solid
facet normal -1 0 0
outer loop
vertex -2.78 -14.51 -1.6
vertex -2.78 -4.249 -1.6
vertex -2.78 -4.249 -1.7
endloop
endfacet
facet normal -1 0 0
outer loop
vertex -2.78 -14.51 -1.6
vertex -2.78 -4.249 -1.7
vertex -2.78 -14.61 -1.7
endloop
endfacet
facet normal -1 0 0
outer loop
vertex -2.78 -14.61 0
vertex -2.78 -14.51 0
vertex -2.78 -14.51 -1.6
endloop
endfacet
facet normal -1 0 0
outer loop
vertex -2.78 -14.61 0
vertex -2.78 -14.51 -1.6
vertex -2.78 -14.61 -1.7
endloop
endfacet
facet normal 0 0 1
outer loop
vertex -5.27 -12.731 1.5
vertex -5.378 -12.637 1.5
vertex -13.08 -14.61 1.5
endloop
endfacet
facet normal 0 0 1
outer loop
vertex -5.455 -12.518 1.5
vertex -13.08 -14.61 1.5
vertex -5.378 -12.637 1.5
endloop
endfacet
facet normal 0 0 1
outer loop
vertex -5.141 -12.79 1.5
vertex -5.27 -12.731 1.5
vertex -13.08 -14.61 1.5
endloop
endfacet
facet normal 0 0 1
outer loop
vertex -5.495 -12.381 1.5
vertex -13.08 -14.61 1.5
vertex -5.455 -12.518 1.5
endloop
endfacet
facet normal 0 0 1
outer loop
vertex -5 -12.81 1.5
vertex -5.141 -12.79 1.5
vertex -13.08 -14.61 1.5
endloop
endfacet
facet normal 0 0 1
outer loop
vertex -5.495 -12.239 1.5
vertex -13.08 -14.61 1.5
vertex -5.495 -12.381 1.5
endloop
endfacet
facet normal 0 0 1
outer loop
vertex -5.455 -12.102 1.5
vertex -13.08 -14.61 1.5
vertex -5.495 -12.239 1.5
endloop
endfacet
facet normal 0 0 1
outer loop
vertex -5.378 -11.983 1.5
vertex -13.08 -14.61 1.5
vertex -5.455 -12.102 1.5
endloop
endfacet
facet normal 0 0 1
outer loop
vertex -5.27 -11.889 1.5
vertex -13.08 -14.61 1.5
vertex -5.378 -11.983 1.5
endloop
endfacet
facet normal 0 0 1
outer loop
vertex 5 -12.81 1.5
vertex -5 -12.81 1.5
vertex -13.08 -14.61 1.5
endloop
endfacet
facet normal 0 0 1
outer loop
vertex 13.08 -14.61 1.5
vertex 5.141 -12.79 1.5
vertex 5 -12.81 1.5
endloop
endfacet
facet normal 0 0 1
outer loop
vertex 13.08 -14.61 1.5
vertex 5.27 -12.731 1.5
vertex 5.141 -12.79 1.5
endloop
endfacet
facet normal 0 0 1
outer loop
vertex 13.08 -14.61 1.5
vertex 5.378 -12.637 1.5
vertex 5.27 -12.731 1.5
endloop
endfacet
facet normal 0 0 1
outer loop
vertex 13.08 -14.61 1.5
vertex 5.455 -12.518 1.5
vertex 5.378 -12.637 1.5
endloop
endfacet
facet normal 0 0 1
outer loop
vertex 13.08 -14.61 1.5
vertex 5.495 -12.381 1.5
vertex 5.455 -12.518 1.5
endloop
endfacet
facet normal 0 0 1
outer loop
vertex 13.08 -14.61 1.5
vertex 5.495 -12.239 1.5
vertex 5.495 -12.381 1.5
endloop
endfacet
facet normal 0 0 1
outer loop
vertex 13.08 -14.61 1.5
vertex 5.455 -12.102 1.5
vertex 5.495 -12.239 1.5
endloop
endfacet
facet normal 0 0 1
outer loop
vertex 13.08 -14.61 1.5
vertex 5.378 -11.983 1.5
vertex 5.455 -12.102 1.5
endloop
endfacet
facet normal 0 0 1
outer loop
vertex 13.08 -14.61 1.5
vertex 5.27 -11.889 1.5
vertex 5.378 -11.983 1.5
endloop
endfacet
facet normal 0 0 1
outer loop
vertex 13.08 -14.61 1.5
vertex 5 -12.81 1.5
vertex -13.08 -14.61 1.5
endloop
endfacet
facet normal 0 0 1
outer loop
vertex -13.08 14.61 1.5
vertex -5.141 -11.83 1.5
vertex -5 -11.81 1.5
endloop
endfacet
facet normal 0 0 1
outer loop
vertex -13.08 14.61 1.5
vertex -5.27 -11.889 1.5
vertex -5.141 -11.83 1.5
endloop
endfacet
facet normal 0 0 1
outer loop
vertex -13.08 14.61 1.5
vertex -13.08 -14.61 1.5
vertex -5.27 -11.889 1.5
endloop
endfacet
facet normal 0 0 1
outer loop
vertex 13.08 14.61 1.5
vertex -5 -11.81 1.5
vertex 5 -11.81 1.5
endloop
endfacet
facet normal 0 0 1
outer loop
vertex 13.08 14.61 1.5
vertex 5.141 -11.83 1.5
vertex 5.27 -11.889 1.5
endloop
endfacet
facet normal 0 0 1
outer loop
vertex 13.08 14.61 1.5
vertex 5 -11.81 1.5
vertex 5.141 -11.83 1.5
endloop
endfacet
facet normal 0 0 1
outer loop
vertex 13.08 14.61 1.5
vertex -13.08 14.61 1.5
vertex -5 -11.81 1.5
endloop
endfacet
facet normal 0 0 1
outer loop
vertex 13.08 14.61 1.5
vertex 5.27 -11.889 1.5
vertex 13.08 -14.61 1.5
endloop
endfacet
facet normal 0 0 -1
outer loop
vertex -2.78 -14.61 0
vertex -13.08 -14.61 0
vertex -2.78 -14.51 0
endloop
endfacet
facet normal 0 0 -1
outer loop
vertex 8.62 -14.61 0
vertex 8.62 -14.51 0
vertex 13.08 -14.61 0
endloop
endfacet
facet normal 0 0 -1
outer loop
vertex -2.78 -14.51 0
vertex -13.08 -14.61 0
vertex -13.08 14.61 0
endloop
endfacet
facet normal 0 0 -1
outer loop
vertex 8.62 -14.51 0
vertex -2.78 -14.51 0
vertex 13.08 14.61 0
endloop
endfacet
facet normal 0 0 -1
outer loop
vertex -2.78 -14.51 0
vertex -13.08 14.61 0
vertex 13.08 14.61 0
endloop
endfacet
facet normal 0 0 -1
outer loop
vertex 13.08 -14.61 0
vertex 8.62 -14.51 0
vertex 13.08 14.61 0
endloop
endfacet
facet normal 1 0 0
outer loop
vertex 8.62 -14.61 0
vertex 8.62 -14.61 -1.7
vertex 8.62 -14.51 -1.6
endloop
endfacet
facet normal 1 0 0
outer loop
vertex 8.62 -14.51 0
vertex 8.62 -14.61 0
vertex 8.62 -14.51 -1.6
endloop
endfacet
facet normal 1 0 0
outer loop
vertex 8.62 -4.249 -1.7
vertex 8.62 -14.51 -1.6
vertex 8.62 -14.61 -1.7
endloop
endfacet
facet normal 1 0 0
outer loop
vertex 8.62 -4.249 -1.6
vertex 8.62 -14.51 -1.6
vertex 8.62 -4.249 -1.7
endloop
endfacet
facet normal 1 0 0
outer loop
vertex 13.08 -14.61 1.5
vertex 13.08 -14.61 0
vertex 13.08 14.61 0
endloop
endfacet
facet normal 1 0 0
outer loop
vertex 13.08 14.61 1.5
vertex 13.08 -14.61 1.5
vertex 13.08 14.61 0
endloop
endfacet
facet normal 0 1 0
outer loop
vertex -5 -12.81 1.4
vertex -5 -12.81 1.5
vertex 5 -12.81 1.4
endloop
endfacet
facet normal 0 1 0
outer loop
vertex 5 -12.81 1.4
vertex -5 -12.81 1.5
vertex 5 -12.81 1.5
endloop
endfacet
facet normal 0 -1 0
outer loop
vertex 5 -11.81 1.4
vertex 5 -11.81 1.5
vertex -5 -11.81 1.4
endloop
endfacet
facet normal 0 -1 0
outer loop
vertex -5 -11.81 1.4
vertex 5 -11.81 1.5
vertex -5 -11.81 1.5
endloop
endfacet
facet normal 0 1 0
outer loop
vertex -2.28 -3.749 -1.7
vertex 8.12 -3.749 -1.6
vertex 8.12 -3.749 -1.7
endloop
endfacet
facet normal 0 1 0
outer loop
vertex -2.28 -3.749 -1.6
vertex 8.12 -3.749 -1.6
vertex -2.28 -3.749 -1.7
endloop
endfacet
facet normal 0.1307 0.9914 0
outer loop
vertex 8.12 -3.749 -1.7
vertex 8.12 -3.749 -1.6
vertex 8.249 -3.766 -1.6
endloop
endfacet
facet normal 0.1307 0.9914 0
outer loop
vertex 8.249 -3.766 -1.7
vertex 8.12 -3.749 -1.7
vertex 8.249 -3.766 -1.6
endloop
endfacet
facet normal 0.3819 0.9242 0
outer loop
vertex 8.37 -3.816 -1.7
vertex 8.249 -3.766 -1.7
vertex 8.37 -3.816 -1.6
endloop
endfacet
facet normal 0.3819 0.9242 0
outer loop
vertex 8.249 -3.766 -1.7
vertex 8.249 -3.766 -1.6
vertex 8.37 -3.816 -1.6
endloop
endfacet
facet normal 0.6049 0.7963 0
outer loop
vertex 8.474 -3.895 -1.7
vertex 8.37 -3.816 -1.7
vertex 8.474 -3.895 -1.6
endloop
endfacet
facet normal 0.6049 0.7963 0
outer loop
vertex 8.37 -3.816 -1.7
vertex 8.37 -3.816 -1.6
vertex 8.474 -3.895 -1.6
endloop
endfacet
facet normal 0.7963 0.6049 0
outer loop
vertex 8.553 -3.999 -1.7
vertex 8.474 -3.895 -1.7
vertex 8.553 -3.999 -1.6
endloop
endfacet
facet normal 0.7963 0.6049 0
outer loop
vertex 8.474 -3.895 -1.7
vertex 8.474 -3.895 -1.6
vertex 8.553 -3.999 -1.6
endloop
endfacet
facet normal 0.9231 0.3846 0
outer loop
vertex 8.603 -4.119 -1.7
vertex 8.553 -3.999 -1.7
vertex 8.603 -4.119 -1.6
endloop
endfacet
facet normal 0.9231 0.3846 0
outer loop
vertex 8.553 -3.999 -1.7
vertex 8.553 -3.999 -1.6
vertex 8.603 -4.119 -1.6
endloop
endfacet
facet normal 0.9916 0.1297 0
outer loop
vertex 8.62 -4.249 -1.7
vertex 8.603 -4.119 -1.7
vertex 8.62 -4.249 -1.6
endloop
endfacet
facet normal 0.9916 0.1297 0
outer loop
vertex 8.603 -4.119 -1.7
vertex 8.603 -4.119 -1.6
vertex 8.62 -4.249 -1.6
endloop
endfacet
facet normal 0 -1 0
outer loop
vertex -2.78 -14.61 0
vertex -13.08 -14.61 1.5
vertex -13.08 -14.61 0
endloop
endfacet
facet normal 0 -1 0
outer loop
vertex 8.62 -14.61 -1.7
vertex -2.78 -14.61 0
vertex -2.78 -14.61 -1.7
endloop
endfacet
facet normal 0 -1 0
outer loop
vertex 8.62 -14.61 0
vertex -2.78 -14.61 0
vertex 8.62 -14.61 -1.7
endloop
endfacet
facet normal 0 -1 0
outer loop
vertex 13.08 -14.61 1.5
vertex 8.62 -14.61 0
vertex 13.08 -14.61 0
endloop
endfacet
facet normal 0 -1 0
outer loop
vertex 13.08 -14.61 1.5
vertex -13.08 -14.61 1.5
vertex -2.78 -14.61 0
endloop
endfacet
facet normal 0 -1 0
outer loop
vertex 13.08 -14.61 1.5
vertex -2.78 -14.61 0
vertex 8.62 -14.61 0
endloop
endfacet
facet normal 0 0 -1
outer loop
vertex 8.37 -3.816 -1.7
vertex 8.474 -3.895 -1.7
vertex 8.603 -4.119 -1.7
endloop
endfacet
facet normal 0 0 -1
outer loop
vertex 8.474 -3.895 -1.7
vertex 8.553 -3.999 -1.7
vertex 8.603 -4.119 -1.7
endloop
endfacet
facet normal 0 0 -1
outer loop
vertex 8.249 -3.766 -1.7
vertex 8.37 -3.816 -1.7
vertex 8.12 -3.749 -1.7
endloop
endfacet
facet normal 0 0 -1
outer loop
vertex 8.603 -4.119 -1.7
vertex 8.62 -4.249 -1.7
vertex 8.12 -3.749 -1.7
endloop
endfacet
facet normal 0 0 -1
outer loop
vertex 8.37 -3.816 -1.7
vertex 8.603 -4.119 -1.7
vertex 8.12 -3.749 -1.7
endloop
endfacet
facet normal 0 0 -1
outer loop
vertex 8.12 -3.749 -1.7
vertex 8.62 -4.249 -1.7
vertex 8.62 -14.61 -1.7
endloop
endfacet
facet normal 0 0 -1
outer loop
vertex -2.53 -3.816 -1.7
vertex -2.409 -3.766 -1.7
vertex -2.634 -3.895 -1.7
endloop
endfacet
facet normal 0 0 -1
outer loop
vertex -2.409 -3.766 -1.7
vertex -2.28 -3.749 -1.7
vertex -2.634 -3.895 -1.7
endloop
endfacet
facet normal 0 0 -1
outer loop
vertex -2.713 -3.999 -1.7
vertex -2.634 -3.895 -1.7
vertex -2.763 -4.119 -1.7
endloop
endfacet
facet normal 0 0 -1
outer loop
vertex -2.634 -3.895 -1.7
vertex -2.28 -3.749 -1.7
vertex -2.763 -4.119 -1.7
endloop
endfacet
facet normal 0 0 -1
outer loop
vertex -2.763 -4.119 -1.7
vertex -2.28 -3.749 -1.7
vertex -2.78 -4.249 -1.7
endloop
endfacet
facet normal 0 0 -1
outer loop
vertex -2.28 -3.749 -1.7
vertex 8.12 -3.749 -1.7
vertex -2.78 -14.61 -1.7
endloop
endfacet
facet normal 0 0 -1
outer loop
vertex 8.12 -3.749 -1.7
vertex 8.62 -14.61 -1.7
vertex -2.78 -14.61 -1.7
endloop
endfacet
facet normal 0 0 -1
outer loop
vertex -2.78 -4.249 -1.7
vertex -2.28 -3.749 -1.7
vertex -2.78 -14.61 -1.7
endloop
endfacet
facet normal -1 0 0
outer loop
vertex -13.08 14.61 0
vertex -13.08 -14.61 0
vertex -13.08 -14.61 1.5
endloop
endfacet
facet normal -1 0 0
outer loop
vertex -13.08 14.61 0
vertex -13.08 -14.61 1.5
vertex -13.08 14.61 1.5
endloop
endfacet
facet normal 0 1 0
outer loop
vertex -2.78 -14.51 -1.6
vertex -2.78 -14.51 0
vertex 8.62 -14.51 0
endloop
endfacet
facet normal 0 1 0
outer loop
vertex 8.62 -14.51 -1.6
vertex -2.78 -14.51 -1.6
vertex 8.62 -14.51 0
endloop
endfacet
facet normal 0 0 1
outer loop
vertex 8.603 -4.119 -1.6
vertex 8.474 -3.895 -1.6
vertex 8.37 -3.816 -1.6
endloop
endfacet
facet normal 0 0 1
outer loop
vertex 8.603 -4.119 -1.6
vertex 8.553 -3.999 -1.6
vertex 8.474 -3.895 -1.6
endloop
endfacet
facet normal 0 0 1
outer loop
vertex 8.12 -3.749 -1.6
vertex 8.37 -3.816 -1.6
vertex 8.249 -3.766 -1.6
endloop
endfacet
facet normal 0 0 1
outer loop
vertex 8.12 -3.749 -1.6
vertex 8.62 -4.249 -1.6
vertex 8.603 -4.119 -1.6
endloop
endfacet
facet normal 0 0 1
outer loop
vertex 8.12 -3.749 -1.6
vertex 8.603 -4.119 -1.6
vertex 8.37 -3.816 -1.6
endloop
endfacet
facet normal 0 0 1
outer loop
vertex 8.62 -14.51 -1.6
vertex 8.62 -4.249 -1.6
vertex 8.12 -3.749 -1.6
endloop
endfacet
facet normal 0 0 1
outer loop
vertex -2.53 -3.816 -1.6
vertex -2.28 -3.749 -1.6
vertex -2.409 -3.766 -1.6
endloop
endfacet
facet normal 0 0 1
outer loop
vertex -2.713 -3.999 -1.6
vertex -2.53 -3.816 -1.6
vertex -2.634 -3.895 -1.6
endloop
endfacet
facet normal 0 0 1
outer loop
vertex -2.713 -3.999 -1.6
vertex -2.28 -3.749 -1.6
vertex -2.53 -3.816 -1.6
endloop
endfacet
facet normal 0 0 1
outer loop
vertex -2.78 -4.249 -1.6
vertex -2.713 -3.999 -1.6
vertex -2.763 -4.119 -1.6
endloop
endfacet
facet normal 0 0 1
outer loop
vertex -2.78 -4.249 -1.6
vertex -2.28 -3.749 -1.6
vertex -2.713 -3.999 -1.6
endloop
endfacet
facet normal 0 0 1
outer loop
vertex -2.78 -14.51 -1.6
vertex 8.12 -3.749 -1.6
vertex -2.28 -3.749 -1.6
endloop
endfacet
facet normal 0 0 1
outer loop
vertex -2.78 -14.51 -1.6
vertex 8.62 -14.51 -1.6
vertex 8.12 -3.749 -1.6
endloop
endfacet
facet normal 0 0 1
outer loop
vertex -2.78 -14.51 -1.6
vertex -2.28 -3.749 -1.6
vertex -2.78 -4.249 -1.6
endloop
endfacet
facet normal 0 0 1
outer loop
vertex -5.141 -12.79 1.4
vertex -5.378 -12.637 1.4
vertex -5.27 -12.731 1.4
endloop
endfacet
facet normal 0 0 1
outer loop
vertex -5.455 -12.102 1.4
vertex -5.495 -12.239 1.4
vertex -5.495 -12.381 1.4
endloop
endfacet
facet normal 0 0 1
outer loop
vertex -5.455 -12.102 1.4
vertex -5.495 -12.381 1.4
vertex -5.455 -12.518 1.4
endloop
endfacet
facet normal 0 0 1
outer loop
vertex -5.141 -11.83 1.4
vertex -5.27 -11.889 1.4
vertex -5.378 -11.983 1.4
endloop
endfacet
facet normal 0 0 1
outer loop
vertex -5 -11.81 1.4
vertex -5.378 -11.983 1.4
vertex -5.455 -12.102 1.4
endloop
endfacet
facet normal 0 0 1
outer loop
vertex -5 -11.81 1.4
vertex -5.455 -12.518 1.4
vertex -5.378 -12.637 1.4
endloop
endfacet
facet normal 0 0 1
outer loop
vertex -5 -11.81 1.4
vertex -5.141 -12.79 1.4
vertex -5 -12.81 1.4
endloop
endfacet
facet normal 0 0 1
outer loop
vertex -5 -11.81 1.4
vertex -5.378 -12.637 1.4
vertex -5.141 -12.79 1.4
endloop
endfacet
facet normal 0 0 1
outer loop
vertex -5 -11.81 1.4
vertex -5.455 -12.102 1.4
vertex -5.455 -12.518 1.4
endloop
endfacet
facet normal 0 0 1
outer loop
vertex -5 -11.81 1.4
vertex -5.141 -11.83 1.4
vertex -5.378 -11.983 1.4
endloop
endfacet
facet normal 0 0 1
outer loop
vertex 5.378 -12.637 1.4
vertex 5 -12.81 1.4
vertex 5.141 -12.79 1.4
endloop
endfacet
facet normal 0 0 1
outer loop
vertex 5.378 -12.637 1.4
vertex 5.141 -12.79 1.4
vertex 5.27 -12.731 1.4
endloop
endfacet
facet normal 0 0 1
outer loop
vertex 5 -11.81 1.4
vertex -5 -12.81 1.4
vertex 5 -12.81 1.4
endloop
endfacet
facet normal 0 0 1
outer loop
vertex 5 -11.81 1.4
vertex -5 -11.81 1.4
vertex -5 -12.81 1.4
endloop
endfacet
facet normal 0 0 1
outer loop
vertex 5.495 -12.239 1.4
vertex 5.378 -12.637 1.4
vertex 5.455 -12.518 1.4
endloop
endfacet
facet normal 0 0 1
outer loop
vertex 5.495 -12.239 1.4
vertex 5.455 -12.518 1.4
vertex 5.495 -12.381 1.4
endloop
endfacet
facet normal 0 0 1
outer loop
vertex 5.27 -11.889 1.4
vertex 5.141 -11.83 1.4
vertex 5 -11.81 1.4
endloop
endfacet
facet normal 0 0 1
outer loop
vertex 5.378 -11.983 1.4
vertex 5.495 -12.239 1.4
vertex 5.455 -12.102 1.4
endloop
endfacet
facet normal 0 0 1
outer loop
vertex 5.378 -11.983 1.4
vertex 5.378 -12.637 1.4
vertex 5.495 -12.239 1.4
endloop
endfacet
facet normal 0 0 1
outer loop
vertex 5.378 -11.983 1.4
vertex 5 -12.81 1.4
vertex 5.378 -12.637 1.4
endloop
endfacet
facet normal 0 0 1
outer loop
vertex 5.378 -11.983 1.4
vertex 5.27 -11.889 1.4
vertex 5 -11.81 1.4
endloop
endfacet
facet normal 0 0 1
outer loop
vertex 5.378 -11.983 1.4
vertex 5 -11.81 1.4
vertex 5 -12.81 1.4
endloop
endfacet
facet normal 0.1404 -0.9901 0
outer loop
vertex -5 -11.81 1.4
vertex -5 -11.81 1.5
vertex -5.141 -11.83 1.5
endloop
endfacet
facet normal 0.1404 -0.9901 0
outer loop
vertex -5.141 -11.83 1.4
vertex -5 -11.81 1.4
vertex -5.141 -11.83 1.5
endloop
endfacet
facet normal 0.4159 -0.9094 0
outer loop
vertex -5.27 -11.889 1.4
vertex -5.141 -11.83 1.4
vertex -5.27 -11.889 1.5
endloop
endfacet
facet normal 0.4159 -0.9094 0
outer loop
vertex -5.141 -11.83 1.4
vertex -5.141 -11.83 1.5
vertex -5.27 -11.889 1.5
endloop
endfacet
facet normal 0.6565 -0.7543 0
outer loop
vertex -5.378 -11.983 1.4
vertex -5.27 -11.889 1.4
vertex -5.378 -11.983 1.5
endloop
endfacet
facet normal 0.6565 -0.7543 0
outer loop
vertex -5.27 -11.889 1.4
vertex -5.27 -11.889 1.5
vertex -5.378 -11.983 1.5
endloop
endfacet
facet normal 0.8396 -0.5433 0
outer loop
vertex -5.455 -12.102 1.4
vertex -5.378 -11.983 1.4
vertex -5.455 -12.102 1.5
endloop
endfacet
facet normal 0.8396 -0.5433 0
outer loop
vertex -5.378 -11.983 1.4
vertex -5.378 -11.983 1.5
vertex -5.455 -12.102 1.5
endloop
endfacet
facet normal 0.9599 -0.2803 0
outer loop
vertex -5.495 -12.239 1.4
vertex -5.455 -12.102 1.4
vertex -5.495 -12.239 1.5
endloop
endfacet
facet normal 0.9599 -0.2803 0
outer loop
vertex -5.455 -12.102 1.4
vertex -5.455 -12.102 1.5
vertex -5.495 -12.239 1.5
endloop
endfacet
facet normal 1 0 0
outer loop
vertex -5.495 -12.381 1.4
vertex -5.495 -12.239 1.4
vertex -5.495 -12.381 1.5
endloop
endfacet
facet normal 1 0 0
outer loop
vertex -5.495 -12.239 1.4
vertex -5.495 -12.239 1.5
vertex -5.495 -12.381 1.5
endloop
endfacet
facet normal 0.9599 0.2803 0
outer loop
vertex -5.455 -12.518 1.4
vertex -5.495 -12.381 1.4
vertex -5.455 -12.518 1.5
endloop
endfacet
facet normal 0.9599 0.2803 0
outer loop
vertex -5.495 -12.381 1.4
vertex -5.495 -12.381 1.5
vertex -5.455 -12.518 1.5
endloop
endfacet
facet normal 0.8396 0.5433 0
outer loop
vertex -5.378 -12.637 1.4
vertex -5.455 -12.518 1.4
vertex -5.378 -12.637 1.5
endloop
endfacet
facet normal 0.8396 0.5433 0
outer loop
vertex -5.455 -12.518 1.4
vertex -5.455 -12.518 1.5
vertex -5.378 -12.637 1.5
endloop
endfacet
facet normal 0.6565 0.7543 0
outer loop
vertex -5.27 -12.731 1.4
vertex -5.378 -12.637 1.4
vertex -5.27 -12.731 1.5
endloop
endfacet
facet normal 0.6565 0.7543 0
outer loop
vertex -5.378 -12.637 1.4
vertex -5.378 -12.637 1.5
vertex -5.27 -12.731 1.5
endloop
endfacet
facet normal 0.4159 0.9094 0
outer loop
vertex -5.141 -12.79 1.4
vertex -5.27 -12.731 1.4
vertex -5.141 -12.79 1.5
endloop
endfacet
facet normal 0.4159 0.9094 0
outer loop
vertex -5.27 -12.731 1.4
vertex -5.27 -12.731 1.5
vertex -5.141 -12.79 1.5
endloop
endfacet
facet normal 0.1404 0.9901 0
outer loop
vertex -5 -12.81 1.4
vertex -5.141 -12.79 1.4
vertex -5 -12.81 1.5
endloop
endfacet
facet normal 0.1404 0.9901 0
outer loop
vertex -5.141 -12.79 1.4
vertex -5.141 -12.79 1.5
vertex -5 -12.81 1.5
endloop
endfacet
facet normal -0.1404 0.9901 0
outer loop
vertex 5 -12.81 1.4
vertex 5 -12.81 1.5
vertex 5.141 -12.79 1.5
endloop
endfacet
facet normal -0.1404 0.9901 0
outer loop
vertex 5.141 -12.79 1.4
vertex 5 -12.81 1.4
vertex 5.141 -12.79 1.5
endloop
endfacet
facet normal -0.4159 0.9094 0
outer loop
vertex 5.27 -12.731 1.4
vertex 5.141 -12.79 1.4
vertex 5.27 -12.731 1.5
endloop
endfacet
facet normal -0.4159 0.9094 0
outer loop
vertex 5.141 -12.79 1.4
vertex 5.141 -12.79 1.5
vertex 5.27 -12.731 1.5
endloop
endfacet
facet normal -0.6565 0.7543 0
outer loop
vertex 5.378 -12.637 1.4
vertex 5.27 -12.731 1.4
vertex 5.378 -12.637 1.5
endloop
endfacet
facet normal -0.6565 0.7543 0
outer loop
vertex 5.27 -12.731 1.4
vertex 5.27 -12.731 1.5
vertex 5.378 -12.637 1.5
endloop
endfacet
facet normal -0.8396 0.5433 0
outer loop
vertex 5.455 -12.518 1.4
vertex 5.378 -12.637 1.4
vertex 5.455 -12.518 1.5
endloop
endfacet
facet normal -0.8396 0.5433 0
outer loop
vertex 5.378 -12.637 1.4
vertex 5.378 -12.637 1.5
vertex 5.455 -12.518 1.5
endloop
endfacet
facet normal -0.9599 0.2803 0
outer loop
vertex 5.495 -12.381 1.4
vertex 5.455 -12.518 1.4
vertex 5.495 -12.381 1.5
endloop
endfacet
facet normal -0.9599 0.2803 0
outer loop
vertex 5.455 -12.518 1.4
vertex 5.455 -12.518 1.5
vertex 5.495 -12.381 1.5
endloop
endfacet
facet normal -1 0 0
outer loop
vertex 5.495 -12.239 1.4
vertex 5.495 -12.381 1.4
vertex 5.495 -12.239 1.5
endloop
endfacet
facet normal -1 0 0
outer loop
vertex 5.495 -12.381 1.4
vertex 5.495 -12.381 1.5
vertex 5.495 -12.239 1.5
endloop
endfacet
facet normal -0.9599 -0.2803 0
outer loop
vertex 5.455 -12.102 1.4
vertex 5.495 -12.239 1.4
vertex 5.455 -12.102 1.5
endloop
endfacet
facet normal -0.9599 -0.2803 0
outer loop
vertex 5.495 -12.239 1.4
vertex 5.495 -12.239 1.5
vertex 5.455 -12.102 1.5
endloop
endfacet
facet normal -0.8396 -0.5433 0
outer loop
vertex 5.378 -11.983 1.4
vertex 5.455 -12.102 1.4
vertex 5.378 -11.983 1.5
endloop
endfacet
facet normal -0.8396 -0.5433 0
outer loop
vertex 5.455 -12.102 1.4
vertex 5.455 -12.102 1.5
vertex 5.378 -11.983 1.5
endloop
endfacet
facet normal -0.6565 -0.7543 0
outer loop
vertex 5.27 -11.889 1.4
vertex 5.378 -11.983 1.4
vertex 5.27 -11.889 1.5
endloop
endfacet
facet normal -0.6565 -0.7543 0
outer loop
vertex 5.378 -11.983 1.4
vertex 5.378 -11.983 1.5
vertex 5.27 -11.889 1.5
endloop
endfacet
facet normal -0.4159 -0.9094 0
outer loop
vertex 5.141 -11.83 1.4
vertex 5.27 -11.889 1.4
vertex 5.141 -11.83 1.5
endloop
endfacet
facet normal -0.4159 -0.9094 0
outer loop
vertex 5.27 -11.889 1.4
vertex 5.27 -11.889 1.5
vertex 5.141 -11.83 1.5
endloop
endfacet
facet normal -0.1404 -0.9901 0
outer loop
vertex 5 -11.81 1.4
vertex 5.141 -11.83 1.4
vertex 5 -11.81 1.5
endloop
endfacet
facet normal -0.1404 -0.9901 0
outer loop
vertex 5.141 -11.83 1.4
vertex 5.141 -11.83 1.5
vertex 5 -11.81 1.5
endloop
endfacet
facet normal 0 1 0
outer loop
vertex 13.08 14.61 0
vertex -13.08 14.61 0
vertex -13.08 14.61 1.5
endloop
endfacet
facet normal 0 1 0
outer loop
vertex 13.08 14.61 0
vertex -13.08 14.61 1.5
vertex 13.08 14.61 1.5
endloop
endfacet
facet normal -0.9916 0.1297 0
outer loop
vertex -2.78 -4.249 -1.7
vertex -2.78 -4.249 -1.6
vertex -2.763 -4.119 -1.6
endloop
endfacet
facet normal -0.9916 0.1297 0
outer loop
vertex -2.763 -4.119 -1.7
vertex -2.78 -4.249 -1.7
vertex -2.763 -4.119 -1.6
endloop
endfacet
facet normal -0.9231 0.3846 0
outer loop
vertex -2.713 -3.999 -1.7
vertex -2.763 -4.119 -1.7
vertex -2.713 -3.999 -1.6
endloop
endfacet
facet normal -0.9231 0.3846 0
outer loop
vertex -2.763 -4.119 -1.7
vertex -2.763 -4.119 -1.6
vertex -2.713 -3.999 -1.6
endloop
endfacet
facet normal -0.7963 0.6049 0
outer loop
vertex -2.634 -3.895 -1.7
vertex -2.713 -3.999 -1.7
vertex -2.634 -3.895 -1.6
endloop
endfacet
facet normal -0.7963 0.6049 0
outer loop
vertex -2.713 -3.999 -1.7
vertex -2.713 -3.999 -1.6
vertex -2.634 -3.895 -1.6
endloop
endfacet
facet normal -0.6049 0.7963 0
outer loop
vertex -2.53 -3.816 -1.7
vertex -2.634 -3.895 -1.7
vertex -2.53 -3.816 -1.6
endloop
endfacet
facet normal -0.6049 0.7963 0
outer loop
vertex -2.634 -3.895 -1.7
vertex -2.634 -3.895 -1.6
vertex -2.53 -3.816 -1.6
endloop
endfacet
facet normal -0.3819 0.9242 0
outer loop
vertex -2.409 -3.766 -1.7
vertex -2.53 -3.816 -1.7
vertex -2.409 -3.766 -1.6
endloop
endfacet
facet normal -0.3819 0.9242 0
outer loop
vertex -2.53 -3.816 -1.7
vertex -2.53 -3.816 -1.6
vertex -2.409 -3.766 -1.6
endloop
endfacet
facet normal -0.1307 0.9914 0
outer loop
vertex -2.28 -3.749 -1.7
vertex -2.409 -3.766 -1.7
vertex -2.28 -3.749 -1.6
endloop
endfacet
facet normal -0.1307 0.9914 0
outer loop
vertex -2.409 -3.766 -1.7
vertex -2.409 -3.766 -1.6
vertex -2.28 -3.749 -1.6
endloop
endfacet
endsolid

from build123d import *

# Parameters (mm, degrees)
SKETCH_W     = 26.16
SKETCH_H     = 29.22
PAD_DEPTH    = 1.5
SKETCH001_W  = 23.4
SKETCH001_H  = 23.4
PAD001_DEPTH = 1
SKETCH002_W  = 11.4
SKETCH002_H  = 0.1
PAD002_DEPTH = 1.6
PAD003_DEPTH = 0.1
POCKET_DEPTH = 0.1


with BuildPart() as part:
    # Sketch → Pad (new body)
    with BuildSketch(Plane.XY):
        Rectangle(SKETCH_W, SKETCH_H)
    extrude(amount=PAD_DEPTH)

    # Sketch001 (on Face6 of Pad) → Pad001 (join)
    with BuildSketch(Plane.XY.offset(1.5)):
        with Locations((0, 1.91)):
            Rectangle(SKETCH001_W, SKETCH001_H)
    extrude(amount=-PAD001_DEPTH)

    # Sketch002 (on Face4 of Pad001) → Pad002 (join)
    with BuildSketch(Plane(origin=(0, 0, 0), x_dir=(1, 0, 0), z_dir=(0, 0, -1))):
        with Locations((2.92, 14.56)):
            Rectangle(SKETCH002_W, SKETCH002_H)
    extrude(amount=PAD002_DEPTH)

    # Sketch003 (on Face12 of Pad002) → Pad003 (join)
    with BuildSketch(Plane(origin=(0, 0, -1.6), x_dir=(1, 0, 0), z_dir=(0, 0, -1))):
        with BuildLine():
            Line((-2.78, 14.61), (8.62, 14.61))
            Line((8.62, 14.61), (8.62, 4.248609))
            ThreePointArc((8.12, 3.748609), (8.473553, 3.895055), (8.62, 4.248609))
            Line((8.12, 3.748609), (-2.28, 3.748609))
            ThreePointArc((-2.78, 4.248609), (-2.633553, 3.895055), (-2.28, 3.748609))
            Line((-2.78, 4.248609), (-2.78, 14.61))
        make_face()
    extrude(amount=PAD003_DEPTH)

    # Sketch004 (on Face5 of Pad003) → Pocket (cut)
    with BuildSketch(Plane.XY.offset(1.5)):
        with BuildLine():
            ThreePointArc((-5, -11.81), (-5.5, -12.31), (-5, -12.81))
            Line((-5, -12.81), (5, -12.81))
            ThreePointArc((5, -12.81), (5.5, -12.31), (5, -11.81))
            Line((5, -11.81), (-5, -11.81))
        make_face()
    extrude(amount=-POCKET_DEPTH, mode=Mode.SUBTRACT)


solid = part.part
